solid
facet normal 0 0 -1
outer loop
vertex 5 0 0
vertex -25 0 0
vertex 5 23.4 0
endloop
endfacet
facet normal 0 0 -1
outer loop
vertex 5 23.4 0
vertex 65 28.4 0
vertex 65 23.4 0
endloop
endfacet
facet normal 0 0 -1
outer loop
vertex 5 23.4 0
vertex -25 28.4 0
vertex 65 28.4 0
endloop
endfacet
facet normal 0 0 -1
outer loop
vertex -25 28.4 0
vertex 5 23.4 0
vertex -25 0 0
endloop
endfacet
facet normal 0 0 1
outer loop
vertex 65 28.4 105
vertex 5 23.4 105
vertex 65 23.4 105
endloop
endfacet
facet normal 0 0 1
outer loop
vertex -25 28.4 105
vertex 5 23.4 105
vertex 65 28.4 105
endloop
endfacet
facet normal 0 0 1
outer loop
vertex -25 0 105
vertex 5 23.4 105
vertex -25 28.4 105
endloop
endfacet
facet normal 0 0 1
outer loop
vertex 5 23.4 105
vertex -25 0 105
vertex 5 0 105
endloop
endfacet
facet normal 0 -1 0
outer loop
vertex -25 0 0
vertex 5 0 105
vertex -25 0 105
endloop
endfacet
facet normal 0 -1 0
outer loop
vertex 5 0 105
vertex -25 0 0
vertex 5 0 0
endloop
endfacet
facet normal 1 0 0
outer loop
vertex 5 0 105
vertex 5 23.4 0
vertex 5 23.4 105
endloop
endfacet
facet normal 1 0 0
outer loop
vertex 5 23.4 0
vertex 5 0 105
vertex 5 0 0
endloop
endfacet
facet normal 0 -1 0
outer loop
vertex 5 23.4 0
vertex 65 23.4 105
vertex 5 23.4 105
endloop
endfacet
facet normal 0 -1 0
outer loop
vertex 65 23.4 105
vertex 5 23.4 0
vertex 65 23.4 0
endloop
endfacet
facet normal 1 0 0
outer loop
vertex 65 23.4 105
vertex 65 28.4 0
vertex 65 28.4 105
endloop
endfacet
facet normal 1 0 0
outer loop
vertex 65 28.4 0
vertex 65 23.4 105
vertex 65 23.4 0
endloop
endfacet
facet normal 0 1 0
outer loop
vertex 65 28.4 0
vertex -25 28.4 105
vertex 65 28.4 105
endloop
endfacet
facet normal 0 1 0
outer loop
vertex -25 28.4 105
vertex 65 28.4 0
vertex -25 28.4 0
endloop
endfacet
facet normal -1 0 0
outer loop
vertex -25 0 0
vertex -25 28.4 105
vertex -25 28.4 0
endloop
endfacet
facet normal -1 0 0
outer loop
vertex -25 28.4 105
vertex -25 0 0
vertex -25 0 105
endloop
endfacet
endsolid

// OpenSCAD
// Dimensions (mm)
shelf_thickness = 18;      // thickness of the shelf being clamped
arm_length      = 65;      // x-extent of the top jaw + arm
spine_x0        = 0;       // left x of the vertical spine
spine_x1        = 5;       // right x of the vertical spine
spine_y0        = 0;       // bottom y of the spine
spine_y1        = 28.4;    // top y of the spine
jaw_x0          = -25;     // left x of both jaws
jaw_x1          = 5;       // right x of the bottom jaw
topjaw_y0       = 23.4;    // bottom y of the top jaw (leaves 18.4 mm gap)
topjaw_y1       = 28.4;    // top y of the top jaw
extrude_len     = 105;     // print length along Z (in use: +Y is up)
hole_d          = 20;      // pipette hole diameter
hole_cx         = 42;      // x-centre of the three holes
hole_cz         = [17.5, 52.5, 87.5];  // z-centres of the three holes

$fn = 64;

// C-shaped clamp profile in the XY plane (2-D)
module profile() { union() {
    // vertical spine
    translate([spine_x0, spine_y0])
        square([spine_x1 - spine_x0, spine_y1 - spine_y0]);
    // bottom jaw
    translate([jaw_x0, 0])
        square([jaw_x1 - jaw_x0, topjaw_y0]);
    // top jaw + forward arm
    translate([jaw_x0, topjaw_y0])
        square([arm_length - jaw_x0, topjaw_y1 - topjaw_y0]);
} }

// Three 20 mm holes through the arm, axes along Y (vertical in use)
module holes() { for (z = hole_cz)
    translate([hole_cx, -1, z])
        rotate([90, 0, 0])
            cylinder(h = extrude_len + 2, r = hole_d / 2, $fn = 64); }

// Final part: extrude the profile 105 mm along Z, then cut the holes
difference() {
    linear_extrude(height = extrude_len)
        profile();
    holes();
}
